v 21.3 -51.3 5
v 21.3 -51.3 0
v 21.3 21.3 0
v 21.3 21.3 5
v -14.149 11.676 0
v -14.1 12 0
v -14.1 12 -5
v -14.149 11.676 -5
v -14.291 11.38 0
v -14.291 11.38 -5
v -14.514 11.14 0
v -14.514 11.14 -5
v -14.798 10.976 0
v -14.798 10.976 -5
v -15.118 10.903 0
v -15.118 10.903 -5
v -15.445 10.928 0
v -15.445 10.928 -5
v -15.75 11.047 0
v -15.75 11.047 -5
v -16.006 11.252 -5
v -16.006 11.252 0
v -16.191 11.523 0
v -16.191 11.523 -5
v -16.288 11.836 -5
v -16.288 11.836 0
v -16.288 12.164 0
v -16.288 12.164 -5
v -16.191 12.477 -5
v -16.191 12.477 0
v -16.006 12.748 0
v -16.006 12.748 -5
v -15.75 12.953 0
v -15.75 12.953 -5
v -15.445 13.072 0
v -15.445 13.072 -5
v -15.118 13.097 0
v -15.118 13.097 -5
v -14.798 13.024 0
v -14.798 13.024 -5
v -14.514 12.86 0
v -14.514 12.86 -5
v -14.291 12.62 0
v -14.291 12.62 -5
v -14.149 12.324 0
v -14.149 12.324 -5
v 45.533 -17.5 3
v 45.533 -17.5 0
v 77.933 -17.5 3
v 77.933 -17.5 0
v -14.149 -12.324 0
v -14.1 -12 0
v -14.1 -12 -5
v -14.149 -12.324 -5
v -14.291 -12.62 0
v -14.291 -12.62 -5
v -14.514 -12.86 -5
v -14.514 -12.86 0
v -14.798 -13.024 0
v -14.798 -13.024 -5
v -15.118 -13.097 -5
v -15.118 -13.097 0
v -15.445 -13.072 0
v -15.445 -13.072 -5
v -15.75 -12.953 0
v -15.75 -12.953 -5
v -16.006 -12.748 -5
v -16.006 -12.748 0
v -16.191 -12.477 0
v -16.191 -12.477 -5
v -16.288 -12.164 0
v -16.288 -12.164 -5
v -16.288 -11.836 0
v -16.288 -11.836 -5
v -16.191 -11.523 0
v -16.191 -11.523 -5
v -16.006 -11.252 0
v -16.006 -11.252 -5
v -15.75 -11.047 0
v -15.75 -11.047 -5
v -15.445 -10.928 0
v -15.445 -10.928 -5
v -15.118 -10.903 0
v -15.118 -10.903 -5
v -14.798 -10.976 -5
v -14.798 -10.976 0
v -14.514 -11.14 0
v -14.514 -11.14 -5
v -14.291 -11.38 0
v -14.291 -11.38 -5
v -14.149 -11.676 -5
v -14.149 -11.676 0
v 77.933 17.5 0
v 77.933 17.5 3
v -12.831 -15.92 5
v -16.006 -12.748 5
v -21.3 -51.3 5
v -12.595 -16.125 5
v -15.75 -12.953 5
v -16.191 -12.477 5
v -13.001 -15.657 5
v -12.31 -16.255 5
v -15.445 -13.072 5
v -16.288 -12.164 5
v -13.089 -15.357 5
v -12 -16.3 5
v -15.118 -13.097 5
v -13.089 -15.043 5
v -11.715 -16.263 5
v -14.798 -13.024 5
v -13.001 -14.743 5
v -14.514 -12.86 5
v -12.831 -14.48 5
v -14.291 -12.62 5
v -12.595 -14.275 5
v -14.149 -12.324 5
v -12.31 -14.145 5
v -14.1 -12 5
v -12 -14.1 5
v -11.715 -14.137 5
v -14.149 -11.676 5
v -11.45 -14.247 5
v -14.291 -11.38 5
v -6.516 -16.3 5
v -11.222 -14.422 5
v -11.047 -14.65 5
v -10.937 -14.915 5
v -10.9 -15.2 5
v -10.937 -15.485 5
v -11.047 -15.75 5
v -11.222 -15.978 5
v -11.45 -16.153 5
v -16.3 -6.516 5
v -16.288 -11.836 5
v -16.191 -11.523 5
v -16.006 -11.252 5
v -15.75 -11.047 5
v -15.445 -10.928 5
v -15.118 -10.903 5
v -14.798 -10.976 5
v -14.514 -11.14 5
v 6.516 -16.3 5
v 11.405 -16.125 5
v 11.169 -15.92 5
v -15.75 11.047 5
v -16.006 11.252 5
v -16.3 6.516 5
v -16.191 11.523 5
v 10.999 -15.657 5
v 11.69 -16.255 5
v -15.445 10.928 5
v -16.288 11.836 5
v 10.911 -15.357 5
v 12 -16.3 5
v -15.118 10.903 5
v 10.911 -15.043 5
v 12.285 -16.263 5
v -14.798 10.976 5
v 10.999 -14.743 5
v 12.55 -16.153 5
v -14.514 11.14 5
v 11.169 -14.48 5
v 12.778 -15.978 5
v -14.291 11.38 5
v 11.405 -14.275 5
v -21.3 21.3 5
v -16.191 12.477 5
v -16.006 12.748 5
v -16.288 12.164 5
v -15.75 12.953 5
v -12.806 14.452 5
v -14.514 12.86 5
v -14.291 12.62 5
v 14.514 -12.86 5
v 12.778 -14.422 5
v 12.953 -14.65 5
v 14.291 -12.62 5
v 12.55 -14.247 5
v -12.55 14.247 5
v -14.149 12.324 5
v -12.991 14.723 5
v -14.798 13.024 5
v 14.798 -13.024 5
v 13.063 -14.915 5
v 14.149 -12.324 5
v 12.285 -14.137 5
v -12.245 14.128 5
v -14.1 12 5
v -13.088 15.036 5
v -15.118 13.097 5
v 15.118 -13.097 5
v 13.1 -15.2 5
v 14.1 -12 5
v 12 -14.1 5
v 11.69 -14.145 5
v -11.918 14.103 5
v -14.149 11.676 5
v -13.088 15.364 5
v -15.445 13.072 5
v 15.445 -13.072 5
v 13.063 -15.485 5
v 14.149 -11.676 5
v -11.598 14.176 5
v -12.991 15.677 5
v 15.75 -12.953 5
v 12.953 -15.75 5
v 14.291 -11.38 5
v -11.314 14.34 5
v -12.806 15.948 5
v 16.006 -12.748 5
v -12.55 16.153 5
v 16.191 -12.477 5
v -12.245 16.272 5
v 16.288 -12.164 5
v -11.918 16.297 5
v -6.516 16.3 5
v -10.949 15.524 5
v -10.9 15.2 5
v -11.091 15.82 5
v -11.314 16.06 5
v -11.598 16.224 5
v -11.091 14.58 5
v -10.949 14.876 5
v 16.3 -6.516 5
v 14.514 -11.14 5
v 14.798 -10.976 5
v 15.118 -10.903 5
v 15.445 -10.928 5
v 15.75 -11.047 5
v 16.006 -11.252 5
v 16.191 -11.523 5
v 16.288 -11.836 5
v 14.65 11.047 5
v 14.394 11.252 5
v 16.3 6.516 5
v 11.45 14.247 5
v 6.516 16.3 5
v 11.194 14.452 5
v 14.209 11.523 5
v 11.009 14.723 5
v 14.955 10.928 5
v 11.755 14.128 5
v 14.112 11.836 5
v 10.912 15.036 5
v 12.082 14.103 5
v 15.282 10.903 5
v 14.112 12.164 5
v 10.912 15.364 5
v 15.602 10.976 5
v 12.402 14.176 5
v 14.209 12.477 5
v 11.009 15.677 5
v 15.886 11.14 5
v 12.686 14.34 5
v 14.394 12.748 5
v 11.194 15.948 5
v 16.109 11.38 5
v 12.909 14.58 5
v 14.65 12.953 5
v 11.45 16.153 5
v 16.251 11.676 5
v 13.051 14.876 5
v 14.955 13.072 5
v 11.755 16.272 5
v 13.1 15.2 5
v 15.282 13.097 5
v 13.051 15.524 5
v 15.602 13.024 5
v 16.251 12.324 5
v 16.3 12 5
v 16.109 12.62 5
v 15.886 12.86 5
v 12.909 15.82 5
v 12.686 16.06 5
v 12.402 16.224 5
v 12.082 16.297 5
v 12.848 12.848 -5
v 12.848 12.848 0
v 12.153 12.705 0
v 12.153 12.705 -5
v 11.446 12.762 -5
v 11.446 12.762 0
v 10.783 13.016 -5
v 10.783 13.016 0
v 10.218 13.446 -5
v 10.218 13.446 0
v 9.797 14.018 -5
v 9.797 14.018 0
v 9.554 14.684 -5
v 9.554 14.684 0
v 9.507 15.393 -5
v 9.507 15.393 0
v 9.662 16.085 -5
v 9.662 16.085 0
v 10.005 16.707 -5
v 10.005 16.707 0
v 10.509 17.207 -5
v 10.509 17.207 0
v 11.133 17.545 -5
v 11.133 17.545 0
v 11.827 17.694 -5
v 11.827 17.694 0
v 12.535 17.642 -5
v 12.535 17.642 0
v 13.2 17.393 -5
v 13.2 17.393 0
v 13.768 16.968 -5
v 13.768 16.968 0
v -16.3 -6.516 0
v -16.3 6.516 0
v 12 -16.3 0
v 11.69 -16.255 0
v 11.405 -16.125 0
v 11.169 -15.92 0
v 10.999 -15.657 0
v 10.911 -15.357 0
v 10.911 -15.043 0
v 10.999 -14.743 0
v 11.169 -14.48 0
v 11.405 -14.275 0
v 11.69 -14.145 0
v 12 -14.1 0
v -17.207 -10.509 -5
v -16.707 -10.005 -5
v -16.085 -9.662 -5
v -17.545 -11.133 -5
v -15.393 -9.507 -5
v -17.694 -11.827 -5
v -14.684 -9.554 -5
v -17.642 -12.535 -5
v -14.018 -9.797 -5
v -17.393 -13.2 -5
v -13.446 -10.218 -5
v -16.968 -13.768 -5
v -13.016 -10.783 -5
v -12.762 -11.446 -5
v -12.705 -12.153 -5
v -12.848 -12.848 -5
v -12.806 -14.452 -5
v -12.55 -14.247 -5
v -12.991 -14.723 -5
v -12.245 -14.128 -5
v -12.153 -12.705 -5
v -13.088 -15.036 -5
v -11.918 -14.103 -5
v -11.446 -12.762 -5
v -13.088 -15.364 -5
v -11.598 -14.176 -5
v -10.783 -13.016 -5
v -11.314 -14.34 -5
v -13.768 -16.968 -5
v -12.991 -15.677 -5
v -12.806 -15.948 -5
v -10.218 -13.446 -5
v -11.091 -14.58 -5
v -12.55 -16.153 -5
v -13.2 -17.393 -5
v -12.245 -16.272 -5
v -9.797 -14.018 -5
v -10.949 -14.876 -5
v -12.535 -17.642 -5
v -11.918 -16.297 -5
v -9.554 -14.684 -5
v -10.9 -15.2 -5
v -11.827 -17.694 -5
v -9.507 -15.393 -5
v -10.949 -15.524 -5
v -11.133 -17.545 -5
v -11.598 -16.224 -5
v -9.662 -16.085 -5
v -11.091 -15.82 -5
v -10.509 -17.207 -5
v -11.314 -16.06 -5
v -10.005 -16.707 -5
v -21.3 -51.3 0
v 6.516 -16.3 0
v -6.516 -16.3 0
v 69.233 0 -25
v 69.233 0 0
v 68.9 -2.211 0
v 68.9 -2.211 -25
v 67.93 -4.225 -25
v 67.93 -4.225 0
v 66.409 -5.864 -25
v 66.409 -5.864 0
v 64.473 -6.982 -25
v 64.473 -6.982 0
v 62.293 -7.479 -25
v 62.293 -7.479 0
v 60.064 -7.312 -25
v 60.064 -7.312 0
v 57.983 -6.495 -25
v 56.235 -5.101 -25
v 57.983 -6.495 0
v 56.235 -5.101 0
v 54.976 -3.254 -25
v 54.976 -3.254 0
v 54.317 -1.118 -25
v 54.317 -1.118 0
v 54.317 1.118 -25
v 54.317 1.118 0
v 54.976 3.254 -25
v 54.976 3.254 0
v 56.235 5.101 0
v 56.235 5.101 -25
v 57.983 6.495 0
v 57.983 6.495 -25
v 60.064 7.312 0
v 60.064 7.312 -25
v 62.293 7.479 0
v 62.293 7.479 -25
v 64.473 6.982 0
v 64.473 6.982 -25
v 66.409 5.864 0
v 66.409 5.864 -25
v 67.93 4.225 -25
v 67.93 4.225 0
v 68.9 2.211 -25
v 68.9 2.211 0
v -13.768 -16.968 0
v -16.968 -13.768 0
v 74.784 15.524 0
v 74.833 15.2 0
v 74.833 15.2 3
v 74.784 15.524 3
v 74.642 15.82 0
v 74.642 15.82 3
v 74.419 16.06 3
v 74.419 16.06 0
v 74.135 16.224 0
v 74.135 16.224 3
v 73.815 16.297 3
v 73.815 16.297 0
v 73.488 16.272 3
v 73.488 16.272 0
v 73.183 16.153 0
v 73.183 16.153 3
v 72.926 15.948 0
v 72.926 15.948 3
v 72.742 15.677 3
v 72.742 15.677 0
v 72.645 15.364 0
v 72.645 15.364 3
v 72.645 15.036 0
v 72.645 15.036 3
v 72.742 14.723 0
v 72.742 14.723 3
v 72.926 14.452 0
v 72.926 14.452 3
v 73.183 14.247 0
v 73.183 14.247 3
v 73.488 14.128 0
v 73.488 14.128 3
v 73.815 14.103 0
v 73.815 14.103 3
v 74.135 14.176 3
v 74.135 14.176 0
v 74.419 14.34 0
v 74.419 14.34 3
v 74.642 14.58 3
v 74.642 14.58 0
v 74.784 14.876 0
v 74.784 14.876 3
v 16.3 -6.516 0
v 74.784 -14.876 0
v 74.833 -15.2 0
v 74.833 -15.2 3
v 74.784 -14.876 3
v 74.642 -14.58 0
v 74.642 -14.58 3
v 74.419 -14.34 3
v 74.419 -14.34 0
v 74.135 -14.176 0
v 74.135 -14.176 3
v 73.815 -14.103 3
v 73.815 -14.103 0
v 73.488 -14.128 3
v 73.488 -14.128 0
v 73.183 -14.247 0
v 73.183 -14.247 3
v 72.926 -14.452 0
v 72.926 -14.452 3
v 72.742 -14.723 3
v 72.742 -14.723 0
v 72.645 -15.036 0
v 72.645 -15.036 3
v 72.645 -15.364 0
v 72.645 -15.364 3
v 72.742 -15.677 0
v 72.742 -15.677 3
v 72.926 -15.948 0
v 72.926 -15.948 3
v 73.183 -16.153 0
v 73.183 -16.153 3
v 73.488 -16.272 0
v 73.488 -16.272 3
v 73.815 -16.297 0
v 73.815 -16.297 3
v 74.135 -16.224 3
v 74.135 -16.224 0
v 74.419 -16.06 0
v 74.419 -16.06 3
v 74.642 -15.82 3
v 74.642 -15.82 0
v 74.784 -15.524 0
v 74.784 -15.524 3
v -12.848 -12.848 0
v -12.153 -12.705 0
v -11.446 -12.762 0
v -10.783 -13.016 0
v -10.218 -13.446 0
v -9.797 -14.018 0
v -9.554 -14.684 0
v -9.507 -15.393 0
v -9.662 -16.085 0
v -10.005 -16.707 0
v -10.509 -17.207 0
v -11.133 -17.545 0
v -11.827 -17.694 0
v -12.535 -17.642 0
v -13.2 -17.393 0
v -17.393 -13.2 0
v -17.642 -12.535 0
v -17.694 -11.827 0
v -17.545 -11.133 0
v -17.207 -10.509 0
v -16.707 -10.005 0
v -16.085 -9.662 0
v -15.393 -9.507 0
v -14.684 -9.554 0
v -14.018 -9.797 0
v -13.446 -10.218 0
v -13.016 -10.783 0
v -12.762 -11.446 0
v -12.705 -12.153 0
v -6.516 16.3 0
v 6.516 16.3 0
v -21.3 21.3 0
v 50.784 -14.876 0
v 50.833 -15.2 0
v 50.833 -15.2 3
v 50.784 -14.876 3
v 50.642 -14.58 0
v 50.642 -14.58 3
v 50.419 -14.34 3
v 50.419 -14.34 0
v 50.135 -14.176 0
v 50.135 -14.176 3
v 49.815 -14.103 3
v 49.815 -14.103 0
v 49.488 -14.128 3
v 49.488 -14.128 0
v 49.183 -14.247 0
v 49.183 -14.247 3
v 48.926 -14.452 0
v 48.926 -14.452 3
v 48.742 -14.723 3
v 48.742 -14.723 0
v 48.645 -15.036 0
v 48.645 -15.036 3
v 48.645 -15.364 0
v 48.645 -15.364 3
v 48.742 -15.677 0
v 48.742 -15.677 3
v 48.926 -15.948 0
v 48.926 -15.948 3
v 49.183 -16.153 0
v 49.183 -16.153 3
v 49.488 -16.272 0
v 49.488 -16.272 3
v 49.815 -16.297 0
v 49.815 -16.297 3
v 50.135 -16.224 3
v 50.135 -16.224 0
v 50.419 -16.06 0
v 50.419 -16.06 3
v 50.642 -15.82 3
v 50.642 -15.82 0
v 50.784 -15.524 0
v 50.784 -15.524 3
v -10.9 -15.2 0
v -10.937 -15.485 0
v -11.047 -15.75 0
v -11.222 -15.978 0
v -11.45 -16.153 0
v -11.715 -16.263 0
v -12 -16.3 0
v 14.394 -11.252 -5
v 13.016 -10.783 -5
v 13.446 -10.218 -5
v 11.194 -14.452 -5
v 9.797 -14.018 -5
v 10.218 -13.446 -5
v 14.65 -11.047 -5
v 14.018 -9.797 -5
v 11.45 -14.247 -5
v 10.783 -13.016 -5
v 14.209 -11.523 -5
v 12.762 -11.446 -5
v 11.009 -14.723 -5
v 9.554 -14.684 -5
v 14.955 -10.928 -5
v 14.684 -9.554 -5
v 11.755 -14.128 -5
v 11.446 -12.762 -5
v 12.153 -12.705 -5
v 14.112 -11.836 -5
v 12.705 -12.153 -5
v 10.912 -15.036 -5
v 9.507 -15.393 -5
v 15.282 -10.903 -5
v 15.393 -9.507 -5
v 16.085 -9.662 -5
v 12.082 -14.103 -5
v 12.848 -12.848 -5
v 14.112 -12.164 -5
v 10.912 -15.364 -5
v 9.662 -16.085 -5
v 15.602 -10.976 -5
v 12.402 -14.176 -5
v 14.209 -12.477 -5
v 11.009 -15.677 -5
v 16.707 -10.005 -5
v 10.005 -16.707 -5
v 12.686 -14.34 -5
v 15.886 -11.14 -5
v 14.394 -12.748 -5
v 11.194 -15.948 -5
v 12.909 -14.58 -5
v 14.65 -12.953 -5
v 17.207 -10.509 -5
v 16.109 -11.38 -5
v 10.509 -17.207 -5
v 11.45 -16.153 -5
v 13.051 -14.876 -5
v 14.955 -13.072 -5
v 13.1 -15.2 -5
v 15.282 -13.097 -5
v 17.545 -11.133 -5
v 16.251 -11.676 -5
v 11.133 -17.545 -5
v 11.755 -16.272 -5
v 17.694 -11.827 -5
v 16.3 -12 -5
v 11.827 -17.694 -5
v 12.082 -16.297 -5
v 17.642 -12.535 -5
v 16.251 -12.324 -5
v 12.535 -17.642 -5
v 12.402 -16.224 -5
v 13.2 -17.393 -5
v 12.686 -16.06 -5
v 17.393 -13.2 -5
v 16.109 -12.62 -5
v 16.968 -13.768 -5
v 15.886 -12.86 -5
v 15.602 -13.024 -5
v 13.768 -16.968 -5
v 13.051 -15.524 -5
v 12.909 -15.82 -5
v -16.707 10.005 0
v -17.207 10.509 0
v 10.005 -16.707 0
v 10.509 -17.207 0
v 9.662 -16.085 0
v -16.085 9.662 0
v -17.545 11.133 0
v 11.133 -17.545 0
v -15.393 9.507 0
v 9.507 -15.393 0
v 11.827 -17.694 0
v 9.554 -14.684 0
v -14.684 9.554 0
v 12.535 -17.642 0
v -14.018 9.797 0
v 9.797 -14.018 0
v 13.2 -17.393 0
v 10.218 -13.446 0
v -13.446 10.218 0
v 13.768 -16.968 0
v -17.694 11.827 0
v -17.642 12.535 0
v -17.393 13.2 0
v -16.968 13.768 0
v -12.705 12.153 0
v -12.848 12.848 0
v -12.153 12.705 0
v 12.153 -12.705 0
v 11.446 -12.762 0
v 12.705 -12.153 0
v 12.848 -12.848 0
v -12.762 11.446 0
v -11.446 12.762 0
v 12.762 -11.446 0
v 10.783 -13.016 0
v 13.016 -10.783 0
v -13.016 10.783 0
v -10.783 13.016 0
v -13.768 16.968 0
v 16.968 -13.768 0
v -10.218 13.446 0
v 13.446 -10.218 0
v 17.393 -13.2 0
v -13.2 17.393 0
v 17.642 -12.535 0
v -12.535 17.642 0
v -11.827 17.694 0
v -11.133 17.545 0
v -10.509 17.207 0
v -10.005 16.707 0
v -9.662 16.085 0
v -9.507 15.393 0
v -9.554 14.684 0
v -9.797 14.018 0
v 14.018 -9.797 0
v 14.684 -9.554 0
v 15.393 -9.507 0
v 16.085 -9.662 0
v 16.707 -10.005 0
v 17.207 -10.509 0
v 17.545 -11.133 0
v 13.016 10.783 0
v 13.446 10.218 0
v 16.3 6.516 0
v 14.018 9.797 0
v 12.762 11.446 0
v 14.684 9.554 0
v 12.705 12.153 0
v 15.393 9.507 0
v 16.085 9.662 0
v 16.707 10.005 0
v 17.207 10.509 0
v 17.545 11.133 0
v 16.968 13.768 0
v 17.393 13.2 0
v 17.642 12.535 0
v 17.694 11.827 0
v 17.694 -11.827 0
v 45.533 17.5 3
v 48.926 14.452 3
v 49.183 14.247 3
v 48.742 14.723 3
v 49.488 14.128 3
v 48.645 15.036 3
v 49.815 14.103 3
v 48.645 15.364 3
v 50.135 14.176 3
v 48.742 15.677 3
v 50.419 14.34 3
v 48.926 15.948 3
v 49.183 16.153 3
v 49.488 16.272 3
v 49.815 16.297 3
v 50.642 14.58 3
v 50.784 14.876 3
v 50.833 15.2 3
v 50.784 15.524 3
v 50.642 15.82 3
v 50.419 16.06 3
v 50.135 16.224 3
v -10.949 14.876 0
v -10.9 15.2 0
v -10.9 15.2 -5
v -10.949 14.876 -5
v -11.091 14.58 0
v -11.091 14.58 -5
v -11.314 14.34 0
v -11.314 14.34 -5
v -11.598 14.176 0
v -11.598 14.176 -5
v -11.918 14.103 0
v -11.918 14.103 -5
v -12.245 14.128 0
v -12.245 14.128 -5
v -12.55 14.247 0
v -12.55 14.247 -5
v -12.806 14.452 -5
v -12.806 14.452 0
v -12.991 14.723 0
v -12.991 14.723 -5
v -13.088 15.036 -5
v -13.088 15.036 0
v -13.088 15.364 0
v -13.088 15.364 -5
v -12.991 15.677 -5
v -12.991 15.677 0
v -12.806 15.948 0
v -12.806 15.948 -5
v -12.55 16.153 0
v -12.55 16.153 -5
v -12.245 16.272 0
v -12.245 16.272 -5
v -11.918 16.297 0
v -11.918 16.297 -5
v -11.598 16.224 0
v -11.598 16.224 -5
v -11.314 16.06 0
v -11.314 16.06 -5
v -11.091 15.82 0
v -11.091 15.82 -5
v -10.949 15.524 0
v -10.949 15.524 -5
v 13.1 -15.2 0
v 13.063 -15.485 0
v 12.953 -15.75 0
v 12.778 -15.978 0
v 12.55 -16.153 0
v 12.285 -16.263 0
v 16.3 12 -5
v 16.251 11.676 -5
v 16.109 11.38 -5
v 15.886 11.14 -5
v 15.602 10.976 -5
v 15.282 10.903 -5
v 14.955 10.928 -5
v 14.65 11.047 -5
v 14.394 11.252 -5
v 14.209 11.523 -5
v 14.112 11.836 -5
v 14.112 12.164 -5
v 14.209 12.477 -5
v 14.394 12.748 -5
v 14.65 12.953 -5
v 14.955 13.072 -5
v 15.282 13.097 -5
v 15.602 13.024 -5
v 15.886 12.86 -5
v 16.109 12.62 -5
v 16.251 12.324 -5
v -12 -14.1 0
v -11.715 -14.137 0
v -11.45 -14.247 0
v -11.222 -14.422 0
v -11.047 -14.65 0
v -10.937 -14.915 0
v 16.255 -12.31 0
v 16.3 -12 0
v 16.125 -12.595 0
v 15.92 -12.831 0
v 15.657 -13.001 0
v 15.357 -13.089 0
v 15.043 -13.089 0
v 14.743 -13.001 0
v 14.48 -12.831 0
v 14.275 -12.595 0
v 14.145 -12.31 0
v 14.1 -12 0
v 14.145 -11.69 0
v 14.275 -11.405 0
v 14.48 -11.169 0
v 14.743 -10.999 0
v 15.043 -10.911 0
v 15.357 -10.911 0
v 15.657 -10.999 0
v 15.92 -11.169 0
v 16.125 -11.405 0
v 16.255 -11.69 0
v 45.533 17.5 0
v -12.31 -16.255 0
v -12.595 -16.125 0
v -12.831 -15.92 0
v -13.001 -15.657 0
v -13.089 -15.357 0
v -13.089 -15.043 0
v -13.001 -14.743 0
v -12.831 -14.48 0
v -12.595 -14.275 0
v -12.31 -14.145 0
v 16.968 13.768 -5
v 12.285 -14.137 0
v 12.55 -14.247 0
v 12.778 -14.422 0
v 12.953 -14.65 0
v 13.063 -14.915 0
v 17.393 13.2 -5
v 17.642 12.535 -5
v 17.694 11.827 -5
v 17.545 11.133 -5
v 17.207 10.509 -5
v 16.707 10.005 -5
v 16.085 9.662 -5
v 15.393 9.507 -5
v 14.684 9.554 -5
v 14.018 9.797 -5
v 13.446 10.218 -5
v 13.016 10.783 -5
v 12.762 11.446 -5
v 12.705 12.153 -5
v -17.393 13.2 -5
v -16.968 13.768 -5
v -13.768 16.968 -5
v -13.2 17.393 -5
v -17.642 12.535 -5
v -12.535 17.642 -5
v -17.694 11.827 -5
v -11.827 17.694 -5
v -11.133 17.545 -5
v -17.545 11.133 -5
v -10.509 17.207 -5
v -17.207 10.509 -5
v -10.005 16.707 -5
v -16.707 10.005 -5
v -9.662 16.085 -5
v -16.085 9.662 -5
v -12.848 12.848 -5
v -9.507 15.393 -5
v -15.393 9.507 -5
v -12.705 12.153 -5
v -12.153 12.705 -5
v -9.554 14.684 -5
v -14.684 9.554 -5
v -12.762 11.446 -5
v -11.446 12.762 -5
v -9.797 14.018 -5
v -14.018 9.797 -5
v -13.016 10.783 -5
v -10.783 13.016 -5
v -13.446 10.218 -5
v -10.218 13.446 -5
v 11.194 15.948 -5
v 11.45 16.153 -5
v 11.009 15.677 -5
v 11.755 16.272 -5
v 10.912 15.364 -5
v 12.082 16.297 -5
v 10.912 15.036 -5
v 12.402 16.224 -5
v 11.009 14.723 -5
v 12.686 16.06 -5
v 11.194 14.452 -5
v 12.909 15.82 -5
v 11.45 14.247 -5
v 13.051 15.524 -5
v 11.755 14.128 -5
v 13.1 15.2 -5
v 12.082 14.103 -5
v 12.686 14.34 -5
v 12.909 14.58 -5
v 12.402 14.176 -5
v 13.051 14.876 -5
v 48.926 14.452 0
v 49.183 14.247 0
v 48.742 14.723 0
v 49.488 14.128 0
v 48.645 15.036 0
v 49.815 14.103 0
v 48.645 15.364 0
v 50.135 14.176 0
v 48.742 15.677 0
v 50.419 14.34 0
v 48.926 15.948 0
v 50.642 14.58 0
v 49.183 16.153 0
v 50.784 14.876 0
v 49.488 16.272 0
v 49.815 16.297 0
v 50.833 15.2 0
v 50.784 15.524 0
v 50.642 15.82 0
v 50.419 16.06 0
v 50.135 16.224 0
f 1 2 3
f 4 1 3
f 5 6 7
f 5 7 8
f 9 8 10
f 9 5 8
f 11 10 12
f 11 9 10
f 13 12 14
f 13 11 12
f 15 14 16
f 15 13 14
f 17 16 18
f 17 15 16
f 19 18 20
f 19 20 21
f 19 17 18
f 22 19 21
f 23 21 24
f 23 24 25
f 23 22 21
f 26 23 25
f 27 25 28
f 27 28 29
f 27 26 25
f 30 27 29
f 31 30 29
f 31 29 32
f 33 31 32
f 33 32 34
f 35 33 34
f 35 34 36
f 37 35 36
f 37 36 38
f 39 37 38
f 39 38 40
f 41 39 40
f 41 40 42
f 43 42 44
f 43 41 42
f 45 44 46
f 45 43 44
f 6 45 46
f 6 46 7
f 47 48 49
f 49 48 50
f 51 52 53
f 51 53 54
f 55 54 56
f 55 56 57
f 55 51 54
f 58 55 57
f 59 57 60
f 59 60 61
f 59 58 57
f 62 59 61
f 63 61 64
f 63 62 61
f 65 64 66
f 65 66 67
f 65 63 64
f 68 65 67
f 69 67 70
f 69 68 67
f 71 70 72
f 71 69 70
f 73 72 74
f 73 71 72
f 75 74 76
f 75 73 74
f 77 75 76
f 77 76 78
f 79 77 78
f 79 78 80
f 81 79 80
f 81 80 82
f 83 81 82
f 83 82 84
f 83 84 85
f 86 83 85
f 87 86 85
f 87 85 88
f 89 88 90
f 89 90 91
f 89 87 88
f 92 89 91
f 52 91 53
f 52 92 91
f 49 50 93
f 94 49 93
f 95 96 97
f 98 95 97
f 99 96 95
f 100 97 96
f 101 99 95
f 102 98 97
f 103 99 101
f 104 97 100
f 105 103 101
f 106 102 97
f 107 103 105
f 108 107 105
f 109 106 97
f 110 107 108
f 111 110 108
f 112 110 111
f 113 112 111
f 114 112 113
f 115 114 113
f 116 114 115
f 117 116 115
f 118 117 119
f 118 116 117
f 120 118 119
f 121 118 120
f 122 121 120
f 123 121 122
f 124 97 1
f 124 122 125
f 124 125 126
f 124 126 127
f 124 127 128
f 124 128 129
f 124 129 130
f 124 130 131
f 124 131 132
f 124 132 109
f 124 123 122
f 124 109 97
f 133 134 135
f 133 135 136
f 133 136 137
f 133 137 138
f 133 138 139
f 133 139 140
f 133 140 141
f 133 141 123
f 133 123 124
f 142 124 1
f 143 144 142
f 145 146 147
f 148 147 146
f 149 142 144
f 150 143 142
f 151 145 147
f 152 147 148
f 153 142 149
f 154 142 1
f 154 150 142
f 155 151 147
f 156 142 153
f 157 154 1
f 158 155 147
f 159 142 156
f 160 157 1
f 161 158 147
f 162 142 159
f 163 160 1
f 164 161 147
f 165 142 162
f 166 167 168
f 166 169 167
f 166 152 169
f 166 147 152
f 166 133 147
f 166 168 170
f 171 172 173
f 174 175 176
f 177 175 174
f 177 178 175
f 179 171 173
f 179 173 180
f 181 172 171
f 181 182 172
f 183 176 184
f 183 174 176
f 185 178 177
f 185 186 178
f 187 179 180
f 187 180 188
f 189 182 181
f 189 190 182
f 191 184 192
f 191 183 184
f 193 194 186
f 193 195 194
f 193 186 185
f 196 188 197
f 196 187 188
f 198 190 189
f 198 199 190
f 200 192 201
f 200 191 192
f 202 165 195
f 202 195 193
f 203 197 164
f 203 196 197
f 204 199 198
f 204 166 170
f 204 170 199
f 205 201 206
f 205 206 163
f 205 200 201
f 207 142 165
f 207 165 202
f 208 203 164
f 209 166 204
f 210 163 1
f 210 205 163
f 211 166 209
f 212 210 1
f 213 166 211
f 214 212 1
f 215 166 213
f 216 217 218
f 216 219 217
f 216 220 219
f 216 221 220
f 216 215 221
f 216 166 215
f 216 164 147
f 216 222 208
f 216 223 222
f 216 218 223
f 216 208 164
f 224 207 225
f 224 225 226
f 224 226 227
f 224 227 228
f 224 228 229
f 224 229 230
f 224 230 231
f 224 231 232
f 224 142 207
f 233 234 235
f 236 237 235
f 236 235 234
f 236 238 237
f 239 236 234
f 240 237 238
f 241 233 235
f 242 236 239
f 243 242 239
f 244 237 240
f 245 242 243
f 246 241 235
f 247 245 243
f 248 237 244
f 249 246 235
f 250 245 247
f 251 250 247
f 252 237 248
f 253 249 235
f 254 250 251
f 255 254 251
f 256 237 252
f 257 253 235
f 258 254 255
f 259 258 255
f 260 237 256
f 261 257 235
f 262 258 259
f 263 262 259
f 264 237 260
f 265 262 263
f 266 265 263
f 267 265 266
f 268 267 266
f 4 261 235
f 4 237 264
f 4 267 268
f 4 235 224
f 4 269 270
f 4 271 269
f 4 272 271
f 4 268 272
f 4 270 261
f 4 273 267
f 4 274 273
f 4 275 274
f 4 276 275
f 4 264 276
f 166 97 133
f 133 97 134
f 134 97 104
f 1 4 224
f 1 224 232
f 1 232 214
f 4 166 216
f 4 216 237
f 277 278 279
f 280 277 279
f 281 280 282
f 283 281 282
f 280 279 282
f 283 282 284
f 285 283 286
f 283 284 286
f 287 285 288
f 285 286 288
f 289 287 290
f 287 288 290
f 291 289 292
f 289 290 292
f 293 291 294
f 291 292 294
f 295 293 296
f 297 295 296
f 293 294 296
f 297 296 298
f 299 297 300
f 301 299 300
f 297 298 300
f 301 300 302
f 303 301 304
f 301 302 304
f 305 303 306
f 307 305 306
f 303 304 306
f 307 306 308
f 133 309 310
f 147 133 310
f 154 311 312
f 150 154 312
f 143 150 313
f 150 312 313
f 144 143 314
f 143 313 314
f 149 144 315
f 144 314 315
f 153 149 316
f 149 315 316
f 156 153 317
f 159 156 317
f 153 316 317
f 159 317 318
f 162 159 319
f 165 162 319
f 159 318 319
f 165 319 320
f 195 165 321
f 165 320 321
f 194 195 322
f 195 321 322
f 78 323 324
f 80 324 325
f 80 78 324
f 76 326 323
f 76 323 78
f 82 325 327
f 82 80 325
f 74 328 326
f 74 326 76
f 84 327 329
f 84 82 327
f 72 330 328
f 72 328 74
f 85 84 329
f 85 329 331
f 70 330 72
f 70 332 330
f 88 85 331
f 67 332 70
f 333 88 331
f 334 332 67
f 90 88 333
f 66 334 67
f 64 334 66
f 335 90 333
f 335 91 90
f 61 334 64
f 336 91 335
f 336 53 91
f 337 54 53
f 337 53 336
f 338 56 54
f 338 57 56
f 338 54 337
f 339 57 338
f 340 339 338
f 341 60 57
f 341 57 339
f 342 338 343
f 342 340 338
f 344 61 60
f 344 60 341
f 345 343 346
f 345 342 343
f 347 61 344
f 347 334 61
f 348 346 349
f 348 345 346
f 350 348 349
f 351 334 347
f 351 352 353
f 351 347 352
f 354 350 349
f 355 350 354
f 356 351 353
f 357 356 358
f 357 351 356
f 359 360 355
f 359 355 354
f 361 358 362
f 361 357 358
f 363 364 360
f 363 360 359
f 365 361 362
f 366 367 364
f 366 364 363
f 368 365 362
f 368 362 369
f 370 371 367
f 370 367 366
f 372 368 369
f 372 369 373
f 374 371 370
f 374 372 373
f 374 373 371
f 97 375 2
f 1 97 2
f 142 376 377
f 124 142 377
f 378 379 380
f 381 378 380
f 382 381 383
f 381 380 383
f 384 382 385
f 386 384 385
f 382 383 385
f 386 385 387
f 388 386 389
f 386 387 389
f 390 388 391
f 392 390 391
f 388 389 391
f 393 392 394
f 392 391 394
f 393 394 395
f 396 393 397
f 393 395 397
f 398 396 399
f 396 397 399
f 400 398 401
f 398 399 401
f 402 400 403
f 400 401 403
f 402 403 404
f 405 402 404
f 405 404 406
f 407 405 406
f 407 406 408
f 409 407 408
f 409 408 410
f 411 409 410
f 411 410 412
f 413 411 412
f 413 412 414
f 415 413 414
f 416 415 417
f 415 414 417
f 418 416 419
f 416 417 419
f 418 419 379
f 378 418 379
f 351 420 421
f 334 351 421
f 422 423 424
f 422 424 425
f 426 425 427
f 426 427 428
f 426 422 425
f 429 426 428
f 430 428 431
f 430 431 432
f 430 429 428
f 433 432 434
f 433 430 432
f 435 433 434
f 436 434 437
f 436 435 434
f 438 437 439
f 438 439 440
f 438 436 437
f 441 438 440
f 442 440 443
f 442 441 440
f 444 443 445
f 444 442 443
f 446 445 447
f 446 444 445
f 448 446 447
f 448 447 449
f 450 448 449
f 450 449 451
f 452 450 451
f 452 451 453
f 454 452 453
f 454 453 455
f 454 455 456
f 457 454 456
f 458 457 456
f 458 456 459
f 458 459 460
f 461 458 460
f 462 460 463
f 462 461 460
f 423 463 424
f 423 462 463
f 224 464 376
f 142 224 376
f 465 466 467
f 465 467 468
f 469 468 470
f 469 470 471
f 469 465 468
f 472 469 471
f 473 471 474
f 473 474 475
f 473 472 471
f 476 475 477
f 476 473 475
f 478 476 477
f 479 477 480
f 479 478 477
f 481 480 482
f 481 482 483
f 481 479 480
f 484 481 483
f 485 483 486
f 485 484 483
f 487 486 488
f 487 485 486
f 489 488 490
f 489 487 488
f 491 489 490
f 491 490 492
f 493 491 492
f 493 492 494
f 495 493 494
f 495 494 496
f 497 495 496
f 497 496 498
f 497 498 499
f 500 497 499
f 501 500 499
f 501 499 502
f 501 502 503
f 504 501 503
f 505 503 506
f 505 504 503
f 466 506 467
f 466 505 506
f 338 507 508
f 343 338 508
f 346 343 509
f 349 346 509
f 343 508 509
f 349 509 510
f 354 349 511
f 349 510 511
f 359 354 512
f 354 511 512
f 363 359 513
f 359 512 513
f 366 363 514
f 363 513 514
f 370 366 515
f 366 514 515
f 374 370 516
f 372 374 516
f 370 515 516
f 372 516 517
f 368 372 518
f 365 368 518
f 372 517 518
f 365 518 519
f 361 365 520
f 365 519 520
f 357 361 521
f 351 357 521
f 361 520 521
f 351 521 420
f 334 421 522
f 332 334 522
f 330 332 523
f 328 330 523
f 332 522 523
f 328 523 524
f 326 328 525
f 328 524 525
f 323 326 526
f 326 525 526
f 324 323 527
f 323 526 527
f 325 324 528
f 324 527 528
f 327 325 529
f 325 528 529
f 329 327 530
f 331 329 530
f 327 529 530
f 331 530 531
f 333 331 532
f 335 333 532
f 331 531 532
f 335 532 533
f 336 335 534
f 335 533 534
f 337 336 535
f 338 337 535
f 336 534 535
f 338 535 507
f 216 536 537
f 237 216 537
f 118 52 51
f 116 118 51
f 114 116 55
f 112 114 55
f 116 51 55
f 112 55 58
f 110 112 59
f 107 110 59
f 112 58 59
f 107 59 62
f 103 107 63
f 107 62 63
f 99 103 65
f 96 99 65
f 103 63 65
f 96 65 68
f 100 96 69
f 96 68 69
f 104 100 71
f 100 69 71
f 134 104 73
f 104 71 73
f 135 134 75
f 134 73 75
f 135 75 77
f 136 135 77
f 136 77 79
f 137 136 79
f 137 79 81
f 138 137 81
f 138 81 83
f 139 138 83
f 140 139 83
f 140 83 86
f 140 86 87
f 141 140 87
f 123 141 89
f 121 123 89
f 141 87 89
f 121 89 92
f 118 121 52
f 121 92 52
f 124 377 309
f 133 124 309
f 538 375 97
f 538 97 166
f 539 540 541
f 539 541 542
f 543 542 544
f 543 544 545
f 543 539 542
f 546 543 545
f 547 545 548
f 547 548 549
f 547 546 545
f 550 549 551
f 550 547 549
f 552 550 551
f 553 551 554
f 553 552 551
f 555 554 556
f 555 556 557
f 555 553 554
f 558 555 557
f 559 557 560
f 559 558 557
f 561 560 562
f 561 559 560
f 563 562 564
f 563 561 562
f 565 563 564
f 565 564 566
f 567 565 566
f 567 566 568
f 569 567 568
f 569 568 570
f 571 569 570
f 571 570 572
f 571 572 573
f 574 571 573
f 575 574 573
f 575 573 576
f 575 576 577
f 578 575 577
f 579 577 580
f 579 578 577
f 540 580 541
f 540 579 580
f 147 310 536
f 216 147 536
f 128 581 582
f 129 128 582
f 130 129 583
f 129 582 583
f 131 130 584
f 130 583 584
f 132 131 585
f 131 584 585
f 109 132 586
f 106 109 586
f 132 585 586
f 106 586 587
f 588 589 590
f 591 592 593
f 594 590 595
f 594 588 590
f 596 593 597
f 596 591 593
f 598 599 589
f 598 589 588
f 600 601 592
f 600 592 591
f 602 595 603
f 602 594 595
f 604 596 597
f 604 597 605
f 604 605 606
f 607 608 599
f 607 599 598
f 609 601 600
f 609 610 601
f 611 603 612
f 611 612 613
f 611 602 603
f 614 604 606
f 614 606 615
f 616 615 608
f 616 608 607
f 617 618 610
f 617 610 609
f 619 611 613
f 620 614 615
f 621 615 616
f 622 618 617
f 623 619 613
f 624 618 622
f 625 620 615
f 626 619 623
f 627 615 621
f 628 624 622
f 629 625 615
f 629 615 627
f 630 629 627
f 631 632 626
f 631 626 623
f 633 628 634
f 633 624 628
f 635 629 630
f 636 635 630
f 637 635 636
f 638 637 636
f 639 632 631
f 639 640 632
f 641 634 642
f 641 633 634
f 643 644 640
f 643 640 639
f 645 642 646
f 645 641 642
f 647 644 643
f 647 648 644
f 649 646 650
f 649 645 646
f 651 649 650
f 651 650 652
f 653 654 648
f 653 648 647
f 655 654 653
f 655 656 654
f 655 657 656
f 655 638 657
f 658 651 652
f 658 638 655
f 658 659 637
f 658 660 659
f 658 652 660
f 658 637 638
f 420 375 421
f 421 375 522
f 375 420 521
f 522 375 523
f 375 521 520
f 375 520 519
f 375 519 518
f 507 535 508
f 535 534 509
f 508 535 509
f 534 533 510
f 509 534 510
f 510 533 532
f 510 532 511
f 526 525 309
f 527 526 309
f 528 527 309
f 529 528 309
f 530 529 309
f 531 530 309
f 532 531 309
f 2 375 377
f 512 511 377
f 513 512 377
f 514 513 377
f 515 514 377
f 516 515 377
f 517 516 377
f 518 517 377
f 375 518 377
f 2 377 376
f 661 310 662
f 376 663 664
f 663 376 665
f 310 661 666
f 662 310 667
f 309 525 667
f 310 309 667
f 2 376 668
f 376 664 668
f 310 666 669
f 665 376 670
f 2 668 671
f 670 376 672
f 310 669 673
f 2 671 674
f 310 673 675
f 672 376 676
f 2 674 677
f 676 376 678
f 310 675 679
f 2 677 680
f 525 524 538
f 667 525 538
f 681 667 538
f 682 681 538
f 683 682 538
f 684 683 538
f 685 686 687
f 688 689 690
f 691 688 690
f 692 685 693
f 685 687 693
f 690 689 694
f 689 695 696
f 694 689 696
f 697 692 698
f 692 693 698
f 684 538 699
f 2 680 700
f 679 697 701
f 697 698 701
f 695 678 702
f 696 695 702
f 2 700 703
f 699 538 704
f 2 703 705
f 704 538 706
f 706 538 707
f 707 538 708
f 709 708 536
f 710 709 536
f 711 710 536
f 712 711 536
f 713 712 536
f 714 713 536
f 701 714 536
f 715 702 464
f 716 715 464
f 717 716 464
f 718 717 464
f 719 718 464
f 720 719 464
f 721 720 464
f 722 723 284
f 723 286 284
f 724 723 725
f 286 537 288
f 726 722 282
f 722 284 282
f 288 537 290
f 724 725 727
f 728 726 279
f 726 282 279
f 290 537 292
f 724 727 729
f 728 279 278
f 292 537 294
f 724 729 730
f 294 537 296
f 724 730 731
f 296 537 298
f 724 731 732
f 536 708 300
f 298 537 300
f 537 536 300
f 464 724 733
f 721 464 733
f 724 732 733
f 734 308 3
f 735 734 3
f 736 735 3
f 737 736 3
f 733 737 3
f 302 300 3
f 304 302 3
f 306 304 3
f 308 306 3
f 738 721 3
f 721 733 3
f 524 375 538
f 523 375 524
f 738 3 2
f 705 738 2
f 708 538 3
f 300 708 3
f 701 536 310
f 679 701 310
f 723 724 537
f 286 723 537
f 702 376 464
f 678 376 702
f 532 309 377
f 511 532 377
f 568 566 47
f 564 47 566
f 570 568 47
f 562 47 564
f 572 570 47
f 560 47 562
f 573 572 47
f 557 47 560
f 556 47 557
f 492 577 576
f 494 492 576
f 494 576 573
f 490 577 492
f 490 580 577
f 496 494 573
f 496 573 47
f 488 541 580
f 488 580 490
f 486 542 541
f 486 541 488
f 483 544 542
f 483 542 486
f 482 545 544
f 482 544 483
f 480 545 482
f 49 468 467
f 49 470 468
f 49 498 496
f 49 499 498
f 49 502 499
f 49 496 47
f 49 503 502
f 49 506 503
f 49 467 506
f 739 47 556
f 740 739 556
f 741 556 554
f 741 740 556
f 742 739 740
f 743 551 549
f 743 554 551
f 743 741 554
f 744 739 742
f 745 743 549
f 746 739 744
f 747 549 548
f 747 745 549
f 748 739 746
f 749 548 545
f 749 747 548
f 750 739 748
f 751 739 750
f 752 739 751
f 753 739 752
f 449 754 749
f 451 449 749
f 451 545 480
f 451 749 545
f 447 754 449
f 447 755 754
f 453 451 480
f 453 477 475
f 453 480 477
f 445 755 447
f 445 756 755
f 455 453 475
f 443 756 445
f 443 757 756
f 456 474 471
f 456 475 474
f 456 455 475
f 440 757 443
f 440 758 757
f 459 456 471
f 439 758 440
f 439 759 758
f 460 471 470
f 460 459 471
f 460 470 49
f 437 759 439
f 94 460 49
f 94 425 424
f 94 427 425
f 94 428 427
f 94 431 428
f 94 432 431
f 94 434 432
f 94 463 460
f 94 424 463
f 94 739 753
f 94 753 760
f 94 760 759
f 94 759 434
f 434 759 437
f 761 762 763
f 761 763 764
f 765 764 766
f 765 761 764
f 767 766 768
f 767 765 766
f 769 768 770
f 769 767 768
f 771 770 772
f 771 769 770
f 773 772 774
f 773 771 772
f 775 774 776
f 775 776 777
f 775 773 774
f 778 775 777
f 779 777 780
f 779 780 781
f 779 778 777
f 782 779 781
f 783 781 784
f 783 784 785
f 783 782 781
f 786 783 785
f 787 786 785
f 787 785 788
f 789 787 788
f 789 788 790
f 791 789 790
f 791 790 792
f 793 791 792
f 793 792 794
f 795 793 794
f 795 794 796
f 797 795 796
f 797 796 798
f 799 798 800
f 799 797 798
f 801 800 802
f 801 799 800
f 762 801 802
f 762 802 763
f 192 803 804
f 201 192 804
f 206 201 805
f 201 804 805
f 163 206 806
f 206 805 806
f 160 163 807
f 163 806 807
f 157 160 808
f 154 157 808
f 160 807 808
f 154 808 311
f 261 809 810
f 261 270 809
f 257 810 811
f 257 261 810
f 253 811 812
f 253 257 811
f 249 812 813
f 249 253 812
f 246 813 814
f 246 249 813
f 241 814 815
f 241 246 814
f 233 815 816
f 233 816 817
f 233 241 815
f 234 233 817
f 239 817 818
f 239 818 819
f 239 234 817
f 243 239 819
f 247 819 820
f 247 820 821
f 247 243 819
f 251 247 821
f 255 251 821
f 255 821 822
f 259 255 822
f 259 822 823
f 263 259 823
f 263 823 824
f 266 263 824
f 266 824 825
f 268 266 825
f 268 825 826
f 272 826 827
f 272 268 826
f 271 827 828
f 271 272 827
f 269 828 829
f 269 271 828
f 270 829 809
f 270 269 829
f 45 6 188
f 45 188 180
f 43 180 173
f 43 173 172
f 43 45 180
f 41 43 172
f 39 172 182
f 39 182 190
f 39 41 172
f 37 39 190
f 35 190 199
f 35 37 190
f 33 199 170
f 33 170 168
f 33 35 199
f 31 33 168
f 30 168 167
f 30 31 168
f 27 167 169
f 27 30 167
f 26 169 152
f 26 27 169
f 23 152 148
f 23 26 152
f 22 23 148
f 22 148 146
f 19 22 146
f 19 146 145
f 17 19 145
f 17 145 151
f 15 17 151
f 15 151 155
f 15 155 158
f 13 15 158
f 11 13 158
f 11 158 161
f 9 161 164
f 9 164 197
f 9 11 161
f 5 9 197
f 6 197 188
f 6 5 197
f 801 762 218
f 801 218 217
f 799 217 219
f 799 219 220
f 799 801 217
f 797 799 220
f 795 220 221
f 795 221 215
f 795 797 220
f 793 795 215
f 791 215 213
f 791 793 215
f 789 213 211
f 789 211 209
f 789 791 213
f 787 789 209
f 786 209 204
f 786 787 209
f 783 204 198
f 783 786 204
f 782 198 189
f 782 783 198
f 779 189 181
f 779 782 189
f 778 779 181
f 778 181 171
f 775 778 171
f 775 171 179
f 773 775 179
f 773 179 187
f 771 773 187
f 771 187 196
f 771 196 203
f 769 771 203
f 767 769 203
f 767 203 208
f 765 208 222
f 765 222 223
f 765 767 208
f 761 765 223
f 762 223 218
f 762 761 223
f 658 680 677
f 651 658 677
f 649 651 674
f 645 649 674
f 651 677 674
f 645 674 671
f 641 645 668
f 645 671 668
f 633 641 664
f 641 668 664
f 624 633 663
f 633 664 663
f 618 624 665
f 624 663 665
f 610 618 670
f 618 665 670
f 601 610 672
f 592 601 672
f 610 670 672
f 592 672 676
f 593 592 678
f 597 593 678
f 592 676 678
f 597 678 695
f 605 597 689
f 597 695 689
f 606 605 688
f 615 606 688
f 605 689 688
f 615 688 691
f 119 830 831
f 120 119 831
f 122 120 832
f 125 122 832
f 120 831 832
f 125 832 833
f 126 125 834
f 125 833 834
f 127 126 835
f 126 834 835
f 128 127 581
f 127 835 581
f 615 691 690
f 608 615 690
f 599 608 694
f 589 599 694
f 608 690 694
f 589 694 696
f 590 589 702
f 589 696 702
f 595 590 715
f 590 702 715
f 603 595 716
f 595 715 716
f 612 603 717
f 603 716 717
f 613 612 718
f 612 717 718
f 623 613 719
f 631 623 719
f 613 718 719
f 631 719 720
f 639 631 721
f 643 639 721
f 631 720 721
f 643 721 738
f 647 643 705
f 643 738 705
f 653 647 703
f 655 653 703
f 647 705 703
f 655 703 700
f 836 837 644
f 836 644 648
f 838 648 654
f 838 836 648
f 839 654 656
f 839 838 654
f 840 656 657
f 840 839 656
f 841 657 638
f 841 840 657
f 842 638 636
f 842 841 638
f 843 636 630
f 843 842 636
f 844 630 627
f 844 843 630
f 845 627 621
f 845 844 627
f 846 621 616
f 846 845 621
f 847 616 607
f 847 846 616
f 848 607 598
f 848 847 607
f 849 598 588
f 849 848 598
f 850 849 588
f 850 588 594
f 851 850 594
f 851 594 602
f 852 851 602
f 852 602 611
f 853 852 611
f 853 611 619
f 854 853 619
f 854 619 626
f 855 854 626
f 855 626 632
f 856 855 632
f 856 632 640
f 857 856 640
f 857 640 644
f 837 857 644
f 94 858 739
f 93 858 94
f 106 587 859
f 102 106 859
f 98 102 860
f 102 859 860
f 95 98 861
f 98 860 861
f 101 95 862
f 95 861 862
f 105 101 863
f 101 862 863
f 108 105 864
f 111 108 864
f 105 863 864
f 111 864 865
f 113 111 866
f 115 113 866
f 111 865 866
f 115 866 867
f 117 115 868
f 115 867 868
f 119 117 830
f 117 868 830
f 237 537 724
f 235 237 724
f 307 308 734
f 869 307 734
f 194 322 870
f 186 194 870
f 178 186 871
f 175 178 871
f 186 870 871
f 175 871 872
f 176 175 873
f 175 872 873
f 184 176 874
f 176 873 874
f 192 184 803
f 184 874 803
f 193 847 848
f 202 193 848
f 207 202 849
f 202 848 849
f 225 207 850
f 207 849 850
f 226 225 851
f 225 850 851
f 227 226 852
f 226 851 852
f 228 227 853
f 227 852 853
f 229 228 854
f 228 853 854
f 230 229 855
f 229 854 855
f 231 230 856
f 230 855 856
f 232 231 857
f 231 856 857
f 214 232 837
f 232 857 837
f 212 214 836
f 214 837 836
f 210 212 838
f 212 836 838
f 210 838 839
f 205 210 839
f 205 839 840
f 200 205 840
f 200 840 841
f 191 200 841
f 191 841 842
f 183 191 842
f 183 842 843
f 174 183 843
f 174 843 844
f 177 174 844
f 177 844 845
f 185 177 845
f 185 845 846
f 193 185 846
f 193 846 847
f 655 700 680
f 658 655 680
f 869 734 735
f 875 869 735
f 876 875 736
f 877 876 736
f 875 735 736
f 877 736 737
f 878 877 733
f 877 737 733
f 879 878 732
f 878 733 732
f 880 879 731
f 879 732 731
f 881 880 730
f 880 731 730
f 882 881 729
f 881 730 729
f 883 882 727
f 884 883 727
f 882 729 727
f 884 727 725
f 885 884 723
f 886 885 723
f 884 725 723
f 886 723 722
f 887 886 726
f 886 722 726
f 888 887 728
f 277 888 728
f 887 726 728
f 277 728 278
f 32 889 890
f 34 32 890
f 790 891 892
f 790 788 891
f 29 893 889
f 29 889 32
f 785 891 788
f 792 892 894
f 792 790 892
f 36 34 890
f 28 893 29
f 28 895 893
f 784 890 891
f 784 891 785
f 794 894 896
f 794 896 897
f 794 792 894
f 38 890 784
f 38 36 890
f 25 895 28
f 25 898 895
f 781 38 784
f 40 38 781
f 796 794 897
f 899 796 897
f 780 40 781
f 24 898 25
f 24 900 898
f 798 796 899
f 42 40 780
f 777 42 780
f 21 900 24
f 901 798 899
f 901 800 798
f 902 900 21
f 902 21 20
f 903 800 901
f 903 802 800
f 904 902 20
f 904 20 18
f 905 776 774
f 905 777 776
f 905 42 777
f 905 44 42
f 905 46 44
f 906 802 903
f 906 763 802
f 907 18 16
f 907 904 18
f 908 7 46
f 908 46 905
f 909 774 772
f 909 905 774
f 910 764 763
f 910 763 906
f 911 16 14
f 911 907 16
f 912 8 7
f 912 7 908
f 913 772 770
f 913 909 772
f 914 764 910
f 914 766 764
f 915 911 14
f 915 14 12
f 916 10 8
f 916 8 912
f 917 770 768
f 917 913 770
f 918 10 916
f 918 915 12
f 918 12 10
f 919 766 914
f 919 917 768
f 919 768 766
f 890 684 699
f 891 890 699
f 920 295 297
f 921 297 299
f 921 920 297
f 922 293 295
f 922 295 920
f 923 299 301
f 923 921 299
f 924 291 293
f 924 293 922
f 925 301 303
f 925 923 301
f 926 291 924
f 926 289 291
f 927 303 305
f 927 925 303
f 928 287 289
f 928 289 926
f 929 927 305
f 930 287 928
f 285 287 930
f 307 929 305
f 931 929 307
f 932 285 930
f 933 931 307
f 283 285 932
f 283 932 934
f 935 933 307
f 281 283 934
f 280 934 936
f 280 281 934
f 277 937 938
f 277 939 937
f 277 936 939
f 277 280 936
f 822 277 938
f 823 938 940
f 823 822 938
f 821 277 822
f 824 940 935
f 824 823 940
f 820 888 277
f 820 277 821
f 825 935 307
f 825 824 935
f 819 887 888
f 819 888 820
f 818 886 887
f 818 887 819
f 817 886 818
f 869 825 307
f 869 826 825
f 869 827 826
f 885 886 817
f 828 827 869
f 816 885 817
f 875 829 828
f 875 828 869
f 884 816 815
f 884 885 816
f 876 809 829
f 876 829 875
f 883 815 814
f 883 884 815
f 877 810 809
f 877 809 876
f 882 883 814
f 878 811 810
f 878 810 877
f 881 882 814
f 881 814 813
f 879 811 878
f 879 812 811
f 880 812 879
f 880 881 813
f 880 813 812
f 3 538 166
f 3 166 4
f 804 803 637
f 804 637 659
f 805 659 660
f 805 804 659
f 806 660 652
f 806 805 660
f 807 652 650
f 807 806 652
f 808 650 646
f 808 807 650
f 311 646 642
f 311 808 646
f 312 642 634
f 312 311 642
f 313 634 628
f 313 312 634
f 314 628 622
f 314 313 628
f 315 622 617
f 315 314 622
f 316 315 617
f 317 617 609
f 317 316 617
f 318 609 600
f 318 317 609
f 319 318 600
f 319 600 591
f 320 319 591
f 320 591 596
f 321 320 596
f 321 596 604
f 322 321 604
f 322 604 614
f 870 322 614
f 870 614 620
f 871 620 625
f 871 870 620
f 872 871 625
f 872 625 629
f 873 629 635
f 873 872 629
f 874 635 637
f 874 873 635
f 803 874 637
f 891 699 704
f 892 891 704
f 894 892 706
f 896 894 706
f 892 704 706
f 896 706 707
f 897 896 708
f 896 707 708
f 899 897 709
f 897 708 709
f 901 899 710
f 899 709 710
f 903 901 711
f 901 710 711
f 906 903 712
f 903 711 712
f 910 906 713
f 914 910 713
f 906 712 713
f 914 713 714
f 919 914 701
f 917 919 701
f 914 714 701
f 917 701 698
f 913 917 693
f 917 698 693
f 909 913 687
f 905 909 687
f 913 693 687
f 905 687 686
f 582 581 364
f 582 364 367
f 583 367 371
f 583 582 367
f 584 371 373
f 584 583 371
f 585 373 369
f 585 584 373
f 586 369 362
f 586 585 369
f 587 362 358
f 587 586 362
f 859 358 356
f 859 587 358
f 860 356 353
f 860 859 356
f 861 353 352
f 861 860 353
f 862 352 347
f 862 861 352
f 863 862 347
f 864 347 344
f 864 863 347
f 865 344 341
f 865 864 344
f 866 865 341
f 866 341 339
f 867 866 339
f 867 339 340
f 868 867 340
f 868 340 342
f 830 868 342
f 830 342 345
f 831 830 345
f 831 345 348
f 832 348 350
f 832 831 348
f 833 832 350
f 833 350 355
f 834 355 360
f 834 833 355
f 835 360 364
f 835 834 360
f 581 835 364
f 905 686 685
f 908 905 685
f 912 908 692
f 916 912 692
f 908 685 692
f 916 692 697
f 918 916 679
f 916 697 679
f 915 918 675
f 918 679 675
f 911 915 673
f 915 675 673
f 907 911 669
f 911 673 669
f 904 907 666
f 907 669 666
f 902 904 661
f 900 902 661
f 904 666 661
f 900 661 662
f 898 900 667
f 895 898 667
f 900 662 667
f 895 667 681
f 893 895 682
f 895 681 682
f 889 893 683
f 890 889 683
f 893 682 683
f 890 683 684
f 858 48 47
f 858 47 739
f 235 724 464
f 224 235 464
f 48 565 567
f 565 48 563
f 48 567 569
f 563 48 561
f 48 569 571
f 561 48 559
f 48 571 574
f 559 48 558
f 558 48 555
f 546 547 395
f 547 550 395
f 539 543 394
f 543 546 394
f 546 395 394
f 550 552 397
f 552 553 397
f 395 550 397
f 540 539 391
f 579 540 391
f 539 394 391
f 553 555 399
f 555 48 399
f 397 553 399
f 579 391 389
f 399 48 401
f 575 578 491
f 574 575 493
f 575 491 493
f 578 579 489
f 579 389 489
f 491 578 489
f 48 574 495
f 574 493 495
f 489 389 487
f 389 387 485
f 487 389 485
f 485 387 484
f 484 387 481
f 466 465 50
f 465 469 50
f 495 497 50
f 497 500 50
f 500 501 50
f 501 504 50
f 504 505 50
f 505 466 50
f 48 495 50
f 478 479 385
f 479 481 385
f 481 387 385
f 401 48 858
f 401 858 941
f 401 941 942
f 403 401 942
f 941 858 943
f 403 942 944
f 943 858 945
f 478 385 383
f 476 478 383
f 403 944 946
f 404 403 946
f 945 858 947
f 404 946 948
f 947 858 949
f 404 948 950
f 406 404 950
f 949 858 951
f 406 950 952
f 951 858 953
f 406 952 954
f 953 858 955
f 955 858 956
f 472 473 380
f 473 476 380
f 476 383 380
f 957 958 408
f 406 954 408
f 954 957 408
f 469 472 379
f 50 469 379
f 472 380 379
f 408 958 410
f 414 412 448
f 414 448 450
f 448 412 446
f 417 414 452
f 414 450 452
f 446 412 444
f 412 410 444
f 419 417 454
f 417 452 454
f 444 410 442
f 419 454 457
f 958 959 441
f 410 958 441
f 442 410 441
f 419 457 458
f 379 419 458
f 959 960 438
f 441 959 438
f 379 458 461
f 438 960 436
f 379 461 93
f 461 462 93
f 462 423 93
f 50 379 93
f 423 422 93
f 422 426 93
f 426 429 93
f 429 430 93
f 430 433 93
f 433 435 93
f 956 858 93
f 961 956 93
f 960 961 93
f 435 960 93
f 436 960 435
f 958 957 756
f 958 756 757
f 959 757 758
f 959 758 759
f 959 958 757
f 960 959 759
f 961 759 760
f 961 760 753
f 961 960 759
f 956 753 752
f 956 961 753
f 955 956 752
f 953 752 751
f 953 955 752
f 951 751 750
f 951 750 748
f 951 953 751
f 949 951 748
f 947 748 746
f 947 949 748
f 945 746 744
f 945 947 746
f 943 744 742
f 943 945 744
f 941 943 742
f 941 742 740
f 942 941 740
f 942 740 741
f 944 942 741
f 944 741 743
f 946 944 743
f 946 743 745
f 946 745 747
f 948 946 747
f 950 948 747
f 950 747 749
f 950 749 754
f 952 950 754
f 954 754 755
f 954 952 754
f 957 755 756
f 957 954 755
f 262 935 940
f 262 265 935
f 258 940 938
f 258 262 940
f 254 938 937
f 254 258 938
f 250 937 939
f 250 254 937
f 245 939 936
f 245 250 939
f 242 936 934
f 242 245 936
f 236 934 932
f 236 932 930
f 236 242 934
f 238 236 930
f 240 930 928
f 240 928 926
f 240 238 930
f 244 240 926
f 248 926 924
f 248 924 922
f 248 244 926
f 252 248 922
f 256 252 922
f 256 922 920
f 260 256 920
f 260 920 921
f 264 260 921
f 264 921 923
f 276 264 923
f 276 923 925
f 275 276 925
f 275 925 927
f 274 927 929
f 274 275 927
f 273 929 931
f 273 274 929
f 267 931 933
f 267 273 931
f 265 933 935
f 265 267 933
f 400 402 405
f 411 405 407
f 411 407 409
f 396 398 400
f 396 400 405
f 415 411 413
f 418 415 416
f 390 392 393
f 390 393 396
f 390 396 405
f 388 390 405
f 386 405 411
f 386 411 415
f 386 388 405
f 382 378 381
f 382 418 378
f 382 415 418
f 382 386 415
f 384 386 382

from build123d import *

# Parameters (mm, degrees)
F1_W     = 42.6
F1_H     = 72.6
F1_R     = 1.1
F2_DEPTH = 5
F3_R     = 1.1
F4_DEPTH = 5
F5_W     = 32.4
F5_H     = 35
F5_R     = 1.1
F6_DEPTH = 3
F7_R     = 7.5
F8_DEPTH = 25


with BuildPart() as f2:
    # F1 (on Top) → F2 (new body)
    with BuildSketch(Plane.XY):
        with Locations((0, -15)):
            Rectangle(F1_W, F1_H)
        with BuildLine():
            ThreePointArc((-10.9, -15.2), (-11.2221825407, -15.9778174593), (-12, -16.3))
            ThreePointArc((-12, -16.3), (-13.1, -15.2), (-12, -14.1))
            ThreePointArc((-12, -14.1), (-11.2221825407, -14.4221825407), (-10.9, -15.2))
        make_face(mode=Mode.SUBTRACT)
        with BuildLine():
            ThreePointArc((13.1, -15.2), (12.7778174593, -15.9778174593), (12, -16.3))
            ThreePointArc((12, -16.3), (10.9, -15.2), (12, -14.1))
            ThreePointArc((12, -14.1), (12.7778174593, -14.4221825407), (13.1, -15.2))
        make_face(mode=Mode.SUBTRACT)
        with BuildLine():
            ThreePointArc((-16.3, -12), (-15.2, -10.9), (-14.1, -12))
            ThreePointArc((-14.1, -12), (-15.2, -13.1), (-16.3, -12))
        make_face(mode=Mode.SUBTRACT)
        with Locations((-15.2, 12)):
            Circle(F1_R, mode=Mode.SUBTRACT)
        with Locations((-12, 15.2)):
            Circle(F1_R, mode=Mode.SUBTRACT)
        Polygon((-16.3, 6.5159379566), (-6.5159379566, 16.3), (0, 16.3), (6.5159379566, 16.3), (16.3, 6.5159379566), (16.3, 0), (16.3, -6.5159379566), (6.5159379566, -16.3), (0, -16.3), (-6.5159379566, -16.3), (-16.3, -6.5159379566), (-16.3, 0), align=None, mode=Mode.SUBTRACT)
        with BuildLine():
            ThreePointArc((16.3, -12), (15.2, -13.1), (14.1, -12))
            ThreePointArc((14.1, -12), (15.2, -10.9), (16.3, -12))
        make_face(mode=Mode.SUBTRACT)
        with Locations((15.2, 12)):
            Circle(F1_R, mode=Mode.SUBTRACT)
        with Locations((12, 15.2)):
            Circle(F1_R, mode=Mode.SUBTRACT)
    extrude(amount=F2_DEPTH)

    # F3 (on face) → F4 (join)
    with BuildSketch(Plane(origin=(0, 0, 0), x_dir=(1, 0, 0), z_dir=(0, 0, -1))):
        with BuildLine():
            ThreePointArc((16.967766953, -13.767766953), (15.7445850487, -9.5600354255), (12.8483351811, -12.8483351811))
            ThreePointArc((12.8483351811, -12.8483351811), (9.5600354255, -15.7445850487), (13.767766953, -16.967766953))
            Line((13.767766953, -16.967766953), (16.967766953, -13.767766953))
        make_face()
        with Locations((12, -15.2)):
            Circle(F3_R, mode=Mode.SUBTRACT)
        with Locations((15.2, -12)):
            Circle(F3_R, mode=Mode.SUBTRACT)
        with BuildLine():
            Line((-16.967766953, -13.767766953), (-13.767766953, -16.967766953))
            ThreePointArc((-13.767766953, -16.967766953), (-9.5600354255, -15.7445850487), (-12.8483351811, -12.8483351811))
            ThreePointArc((-12.8483351811, -12.8483351811), (-15.7445850487, -9.5600354255), (-16.967766953, -13.767766953))
        make_face()
        with Locations((-12, -15.2)):
            Circle(F3_R, mode=Mode.SUBTRACT)
        with Locations((-15.2, -12)):
            Circle(F3_R, mode=Mode.SUBTRACT)
        with BuildLine():
            ThreePointArc((12.8483351811, 12.8483351811), (15.7445850487, 9.5600354255), (16.967766953, 13.767766953))
            Line((16.967766953, 13.767766953), (13.767766953, 16.967766953))
            ThreePointArc((13.767766953, 16.967766953), (9.5600354255, 15.7445850487), (12.8483351811, 12.8483351811))
        make_face()
        with Locations((15.2, 12)):
            Circle(F3_R, mode=Mode.SUBTRACT)
        with Locations((12, 15.2)):
            Circle(F3_R, mode=Mode.SUBTRACT)
        with BuildLine():
            ThreePointArc((-16.967766953, 13.767766953), (-15.7445850487, 9.5600354255), (-12.8483351811, 12.8483351811))
            ThreePointArc((-12.8483351811, 12.8483351811), (-9.5600354255, 15.7445850487), (-13.767766953, 16.967766953))
            Line((-13.767766953, 16.967766953), (-16.967766953, 13.767766953))
        make_face()
        with Locations((-15.2, 12)):
            Circle(F3_R, mode=Mode.SUBTRACT)
        with Locations((-12, 15.2)):
            Circle(F3_R, mode=Mode.SUBTRACT)
    extrude(amount=F4_DEPTH)


with BuildPart() as f6:
    # F5 (on Top) → F6 (new body)
    with BuildSketch(Plane.XY):
        with Locations((61.7328245704, 0)):
            Rectangle(F5_W, F5_H)
        with Locations((49.7328245704, -15.2)):
            Circle(F5_R, mode=Mode.SUBTRACT)
        with Locations((73.7328245704, -15.2)):
            Circle(F5_R, mode=Mode.SUBTRACT)
        with Locations((49.7328245704, 15.2)):
            Circle(F5_R, mode=Mode.SUBTRACT)
        with Locations((73.7328245704, 15.2)):
            Circle(F5_R, mode=Mode.SUBTRACT)
    extrude(amount=F6_DEPTH)

    # F7 (on face) → F8 (join)
    with BuildSketch(Plane(origin=(0, 0, 0), x_dir=(1, 0, 0), z_dir=(0, 0, -1))):
        with Locations((61.7328245704, 0)):
            Circle(F7_R)
    extrude(amount=F8_DEPTH)


solid = Compound([f2.part, f6.part])
